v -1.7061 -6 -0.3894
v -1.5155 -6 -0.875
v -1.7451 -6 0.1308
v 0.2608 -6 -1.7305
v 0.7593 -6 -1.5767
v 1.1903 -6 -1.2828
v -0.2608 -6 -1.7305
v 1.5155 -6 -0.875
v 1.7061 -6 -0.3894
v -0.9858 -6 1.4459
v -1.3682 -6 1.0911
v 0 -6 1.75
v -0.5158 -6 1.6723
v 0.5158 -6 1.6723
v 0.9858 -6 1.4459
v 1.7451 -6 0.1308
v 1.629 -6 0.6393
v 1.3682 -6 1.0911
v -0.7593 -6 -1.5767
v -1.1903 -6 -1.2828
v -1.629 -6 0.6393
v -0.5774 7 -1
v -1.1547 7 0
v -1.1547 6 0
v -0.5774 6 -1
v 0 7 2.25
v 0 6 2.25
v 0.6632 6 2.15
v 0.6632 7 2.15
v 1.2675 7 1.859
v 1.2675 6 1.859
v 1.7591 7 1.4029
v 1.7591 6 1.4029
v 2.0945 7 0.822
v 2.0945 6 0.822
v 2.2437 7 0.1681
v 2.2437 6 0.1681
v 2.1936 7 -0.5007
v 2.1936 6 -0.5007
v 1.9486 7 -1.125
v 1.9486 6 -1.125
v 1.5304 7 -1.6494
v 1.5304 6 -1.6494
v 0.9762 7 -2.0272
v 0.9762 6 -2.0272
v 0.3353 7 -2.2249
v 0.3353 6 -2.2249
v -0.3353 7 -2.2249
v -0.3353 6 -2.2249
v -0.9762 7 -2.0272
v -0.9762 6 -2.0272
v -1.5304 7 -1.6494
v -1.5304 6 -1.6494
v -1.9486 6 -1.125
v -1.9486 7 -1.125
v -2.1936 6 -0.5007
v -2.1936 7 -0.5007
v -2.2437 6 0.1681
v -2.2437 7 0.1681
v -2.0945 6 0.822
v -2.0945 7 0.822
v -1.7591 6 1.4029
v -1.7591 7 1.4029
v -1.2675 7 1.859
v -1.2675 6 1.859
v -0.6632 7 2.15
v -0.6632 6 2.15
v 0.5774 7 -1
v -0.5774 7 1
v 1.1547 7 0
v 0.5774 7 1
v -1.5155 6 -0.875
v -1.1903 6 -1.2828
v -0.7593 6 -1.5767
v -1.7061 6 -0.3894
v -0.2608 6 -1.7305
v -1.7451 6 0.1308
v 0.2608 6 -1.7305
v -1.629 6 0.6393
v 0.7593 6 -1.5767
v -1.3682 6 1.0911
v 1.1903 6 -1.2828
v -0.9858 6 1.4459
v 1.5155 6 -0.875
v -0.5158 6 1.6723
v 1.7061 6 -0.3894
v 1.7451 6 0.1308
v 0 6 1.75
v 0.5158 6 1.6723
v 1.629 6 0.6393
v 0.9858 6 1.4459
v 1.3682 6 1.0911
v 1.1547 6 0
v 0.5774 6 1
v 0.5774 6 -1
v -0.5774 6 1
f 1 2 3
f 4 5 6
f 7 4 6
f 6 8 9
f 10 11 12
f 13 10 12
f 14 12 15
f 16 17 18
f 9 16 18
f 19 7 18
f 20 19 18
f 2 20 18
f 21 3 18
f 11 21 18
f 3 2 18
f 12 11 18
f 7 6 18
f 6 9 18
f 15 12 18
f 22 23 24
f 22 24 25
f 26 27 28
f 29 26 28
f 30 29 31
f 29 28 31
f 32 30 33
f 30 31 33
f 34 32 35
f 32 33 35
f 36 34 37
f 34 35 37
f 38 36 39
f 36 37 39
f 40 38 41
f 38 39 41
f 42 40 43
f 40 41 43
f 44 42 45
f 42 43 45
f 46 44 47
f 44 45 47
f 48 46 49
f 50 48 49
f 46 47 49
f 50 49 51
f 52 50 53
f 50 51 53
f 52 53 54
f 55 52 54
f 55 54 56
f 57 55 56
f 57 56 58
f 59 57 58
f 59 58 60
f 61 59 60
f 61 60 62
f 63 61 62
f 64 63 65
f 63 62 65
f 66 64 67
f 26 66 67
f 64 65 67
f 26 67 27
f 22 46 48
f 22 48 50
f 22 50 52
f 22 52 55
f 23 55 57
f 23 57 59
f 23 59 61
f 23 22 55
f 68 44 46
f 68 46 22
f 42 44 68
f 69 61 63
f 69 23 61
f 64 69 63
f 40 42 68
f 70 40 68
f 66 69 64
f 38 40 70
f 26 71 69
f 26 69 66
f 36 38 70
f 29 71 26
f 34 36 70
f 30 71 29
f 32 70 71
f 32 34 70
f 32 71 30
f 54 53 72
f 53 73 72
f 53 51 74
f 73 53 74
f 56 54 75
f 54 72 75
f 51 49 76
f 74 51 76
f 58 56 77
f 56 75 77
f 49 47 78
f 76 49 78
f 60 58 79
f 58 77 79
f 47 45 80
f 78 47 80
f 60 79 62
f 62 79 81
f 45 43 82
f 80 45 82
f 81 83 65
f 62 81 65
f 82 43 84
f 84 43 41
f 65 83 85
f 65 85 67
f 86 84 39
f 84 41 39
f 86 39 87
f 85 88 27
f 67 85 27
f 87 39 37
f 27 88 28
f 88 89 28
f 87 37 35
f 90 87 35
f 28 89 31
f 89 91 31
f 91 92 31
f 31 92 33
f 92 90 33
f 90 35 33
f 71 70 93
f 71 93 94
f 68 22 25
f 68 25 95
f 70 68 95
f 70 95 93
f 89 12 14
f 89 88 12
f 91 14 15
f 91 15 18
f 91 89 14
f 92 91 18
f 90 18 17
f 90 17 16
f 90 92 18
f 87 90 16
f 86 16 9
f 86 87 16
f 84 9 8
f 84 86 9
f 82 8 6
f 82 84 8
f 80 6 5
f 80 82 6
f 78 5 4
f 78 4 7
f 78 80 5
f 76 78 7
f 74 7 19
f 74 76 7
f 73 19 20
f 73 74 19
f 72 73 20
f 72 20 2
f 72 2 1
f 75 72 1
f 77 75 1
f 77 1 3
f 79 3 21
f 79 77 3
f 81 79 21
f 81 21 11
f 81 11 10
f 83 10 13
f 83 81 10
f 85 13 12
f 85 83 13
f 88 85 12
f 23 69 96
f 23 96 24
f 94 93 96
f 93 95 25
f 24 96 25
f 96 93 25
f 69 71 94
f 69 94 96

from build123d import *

# Parameters (mm, degrees)
SKETCH1_R           = 1.75
BOSS_EXTRUDE1_DEPTH = 6
SKETCH2_R           = 2.25
BOSS_EXTRUDE2_DEPTH = 1
CUT_EXTRUDE1_DEPTH  = 1


with BuildPart() as part:
    # Sketch1 → Boss-Extrude1 (new, symmetric)
    with BuildSketch(Plane(origin=(0, 0, 0), x_dir=(1, 0, 0), z_dir=(0, 1, 0))):
        with Locations(Location((0, 0, 0), (0, 0, 270))):
            Circle(SKETCH1_R)
    extrude(amount=BOSS_EXTRUDE1_DEPTH, both=True)

    # Sketch2 → Boss-Extrude2 (add)
    with BuildSketch(Plane(origin=(0, 6, 0), x_dir=(1, 0, 0), z_dir=(0, 1, 0))):
        with Locations(Location((0, 0, 0), (0, 0, 270))):
            Circle(SKETCH2_R)
    extrude(amount=BOSS_EXTRUDE2_DEPTH)

    # Sketch3 → Cut-Extrude1 (cut)
    with BuildSketch(Plane(origin=(0, 7, 0), x_dir=(1, 0, 0), z_dir=(0, 1, 0))):
        Polygon((0.577350272, 1), (1.154700538, -4e-09), (0.577350269, -1.000000006), (-0.577350271, -1.000000002), (-1.15470054, 0), (-0.577350268, 1), align=None)
    extrude(amount=-CUT_EXTRUDE1_DEPTH, mode=Mode.SUBTRACT)


solid = part.part
